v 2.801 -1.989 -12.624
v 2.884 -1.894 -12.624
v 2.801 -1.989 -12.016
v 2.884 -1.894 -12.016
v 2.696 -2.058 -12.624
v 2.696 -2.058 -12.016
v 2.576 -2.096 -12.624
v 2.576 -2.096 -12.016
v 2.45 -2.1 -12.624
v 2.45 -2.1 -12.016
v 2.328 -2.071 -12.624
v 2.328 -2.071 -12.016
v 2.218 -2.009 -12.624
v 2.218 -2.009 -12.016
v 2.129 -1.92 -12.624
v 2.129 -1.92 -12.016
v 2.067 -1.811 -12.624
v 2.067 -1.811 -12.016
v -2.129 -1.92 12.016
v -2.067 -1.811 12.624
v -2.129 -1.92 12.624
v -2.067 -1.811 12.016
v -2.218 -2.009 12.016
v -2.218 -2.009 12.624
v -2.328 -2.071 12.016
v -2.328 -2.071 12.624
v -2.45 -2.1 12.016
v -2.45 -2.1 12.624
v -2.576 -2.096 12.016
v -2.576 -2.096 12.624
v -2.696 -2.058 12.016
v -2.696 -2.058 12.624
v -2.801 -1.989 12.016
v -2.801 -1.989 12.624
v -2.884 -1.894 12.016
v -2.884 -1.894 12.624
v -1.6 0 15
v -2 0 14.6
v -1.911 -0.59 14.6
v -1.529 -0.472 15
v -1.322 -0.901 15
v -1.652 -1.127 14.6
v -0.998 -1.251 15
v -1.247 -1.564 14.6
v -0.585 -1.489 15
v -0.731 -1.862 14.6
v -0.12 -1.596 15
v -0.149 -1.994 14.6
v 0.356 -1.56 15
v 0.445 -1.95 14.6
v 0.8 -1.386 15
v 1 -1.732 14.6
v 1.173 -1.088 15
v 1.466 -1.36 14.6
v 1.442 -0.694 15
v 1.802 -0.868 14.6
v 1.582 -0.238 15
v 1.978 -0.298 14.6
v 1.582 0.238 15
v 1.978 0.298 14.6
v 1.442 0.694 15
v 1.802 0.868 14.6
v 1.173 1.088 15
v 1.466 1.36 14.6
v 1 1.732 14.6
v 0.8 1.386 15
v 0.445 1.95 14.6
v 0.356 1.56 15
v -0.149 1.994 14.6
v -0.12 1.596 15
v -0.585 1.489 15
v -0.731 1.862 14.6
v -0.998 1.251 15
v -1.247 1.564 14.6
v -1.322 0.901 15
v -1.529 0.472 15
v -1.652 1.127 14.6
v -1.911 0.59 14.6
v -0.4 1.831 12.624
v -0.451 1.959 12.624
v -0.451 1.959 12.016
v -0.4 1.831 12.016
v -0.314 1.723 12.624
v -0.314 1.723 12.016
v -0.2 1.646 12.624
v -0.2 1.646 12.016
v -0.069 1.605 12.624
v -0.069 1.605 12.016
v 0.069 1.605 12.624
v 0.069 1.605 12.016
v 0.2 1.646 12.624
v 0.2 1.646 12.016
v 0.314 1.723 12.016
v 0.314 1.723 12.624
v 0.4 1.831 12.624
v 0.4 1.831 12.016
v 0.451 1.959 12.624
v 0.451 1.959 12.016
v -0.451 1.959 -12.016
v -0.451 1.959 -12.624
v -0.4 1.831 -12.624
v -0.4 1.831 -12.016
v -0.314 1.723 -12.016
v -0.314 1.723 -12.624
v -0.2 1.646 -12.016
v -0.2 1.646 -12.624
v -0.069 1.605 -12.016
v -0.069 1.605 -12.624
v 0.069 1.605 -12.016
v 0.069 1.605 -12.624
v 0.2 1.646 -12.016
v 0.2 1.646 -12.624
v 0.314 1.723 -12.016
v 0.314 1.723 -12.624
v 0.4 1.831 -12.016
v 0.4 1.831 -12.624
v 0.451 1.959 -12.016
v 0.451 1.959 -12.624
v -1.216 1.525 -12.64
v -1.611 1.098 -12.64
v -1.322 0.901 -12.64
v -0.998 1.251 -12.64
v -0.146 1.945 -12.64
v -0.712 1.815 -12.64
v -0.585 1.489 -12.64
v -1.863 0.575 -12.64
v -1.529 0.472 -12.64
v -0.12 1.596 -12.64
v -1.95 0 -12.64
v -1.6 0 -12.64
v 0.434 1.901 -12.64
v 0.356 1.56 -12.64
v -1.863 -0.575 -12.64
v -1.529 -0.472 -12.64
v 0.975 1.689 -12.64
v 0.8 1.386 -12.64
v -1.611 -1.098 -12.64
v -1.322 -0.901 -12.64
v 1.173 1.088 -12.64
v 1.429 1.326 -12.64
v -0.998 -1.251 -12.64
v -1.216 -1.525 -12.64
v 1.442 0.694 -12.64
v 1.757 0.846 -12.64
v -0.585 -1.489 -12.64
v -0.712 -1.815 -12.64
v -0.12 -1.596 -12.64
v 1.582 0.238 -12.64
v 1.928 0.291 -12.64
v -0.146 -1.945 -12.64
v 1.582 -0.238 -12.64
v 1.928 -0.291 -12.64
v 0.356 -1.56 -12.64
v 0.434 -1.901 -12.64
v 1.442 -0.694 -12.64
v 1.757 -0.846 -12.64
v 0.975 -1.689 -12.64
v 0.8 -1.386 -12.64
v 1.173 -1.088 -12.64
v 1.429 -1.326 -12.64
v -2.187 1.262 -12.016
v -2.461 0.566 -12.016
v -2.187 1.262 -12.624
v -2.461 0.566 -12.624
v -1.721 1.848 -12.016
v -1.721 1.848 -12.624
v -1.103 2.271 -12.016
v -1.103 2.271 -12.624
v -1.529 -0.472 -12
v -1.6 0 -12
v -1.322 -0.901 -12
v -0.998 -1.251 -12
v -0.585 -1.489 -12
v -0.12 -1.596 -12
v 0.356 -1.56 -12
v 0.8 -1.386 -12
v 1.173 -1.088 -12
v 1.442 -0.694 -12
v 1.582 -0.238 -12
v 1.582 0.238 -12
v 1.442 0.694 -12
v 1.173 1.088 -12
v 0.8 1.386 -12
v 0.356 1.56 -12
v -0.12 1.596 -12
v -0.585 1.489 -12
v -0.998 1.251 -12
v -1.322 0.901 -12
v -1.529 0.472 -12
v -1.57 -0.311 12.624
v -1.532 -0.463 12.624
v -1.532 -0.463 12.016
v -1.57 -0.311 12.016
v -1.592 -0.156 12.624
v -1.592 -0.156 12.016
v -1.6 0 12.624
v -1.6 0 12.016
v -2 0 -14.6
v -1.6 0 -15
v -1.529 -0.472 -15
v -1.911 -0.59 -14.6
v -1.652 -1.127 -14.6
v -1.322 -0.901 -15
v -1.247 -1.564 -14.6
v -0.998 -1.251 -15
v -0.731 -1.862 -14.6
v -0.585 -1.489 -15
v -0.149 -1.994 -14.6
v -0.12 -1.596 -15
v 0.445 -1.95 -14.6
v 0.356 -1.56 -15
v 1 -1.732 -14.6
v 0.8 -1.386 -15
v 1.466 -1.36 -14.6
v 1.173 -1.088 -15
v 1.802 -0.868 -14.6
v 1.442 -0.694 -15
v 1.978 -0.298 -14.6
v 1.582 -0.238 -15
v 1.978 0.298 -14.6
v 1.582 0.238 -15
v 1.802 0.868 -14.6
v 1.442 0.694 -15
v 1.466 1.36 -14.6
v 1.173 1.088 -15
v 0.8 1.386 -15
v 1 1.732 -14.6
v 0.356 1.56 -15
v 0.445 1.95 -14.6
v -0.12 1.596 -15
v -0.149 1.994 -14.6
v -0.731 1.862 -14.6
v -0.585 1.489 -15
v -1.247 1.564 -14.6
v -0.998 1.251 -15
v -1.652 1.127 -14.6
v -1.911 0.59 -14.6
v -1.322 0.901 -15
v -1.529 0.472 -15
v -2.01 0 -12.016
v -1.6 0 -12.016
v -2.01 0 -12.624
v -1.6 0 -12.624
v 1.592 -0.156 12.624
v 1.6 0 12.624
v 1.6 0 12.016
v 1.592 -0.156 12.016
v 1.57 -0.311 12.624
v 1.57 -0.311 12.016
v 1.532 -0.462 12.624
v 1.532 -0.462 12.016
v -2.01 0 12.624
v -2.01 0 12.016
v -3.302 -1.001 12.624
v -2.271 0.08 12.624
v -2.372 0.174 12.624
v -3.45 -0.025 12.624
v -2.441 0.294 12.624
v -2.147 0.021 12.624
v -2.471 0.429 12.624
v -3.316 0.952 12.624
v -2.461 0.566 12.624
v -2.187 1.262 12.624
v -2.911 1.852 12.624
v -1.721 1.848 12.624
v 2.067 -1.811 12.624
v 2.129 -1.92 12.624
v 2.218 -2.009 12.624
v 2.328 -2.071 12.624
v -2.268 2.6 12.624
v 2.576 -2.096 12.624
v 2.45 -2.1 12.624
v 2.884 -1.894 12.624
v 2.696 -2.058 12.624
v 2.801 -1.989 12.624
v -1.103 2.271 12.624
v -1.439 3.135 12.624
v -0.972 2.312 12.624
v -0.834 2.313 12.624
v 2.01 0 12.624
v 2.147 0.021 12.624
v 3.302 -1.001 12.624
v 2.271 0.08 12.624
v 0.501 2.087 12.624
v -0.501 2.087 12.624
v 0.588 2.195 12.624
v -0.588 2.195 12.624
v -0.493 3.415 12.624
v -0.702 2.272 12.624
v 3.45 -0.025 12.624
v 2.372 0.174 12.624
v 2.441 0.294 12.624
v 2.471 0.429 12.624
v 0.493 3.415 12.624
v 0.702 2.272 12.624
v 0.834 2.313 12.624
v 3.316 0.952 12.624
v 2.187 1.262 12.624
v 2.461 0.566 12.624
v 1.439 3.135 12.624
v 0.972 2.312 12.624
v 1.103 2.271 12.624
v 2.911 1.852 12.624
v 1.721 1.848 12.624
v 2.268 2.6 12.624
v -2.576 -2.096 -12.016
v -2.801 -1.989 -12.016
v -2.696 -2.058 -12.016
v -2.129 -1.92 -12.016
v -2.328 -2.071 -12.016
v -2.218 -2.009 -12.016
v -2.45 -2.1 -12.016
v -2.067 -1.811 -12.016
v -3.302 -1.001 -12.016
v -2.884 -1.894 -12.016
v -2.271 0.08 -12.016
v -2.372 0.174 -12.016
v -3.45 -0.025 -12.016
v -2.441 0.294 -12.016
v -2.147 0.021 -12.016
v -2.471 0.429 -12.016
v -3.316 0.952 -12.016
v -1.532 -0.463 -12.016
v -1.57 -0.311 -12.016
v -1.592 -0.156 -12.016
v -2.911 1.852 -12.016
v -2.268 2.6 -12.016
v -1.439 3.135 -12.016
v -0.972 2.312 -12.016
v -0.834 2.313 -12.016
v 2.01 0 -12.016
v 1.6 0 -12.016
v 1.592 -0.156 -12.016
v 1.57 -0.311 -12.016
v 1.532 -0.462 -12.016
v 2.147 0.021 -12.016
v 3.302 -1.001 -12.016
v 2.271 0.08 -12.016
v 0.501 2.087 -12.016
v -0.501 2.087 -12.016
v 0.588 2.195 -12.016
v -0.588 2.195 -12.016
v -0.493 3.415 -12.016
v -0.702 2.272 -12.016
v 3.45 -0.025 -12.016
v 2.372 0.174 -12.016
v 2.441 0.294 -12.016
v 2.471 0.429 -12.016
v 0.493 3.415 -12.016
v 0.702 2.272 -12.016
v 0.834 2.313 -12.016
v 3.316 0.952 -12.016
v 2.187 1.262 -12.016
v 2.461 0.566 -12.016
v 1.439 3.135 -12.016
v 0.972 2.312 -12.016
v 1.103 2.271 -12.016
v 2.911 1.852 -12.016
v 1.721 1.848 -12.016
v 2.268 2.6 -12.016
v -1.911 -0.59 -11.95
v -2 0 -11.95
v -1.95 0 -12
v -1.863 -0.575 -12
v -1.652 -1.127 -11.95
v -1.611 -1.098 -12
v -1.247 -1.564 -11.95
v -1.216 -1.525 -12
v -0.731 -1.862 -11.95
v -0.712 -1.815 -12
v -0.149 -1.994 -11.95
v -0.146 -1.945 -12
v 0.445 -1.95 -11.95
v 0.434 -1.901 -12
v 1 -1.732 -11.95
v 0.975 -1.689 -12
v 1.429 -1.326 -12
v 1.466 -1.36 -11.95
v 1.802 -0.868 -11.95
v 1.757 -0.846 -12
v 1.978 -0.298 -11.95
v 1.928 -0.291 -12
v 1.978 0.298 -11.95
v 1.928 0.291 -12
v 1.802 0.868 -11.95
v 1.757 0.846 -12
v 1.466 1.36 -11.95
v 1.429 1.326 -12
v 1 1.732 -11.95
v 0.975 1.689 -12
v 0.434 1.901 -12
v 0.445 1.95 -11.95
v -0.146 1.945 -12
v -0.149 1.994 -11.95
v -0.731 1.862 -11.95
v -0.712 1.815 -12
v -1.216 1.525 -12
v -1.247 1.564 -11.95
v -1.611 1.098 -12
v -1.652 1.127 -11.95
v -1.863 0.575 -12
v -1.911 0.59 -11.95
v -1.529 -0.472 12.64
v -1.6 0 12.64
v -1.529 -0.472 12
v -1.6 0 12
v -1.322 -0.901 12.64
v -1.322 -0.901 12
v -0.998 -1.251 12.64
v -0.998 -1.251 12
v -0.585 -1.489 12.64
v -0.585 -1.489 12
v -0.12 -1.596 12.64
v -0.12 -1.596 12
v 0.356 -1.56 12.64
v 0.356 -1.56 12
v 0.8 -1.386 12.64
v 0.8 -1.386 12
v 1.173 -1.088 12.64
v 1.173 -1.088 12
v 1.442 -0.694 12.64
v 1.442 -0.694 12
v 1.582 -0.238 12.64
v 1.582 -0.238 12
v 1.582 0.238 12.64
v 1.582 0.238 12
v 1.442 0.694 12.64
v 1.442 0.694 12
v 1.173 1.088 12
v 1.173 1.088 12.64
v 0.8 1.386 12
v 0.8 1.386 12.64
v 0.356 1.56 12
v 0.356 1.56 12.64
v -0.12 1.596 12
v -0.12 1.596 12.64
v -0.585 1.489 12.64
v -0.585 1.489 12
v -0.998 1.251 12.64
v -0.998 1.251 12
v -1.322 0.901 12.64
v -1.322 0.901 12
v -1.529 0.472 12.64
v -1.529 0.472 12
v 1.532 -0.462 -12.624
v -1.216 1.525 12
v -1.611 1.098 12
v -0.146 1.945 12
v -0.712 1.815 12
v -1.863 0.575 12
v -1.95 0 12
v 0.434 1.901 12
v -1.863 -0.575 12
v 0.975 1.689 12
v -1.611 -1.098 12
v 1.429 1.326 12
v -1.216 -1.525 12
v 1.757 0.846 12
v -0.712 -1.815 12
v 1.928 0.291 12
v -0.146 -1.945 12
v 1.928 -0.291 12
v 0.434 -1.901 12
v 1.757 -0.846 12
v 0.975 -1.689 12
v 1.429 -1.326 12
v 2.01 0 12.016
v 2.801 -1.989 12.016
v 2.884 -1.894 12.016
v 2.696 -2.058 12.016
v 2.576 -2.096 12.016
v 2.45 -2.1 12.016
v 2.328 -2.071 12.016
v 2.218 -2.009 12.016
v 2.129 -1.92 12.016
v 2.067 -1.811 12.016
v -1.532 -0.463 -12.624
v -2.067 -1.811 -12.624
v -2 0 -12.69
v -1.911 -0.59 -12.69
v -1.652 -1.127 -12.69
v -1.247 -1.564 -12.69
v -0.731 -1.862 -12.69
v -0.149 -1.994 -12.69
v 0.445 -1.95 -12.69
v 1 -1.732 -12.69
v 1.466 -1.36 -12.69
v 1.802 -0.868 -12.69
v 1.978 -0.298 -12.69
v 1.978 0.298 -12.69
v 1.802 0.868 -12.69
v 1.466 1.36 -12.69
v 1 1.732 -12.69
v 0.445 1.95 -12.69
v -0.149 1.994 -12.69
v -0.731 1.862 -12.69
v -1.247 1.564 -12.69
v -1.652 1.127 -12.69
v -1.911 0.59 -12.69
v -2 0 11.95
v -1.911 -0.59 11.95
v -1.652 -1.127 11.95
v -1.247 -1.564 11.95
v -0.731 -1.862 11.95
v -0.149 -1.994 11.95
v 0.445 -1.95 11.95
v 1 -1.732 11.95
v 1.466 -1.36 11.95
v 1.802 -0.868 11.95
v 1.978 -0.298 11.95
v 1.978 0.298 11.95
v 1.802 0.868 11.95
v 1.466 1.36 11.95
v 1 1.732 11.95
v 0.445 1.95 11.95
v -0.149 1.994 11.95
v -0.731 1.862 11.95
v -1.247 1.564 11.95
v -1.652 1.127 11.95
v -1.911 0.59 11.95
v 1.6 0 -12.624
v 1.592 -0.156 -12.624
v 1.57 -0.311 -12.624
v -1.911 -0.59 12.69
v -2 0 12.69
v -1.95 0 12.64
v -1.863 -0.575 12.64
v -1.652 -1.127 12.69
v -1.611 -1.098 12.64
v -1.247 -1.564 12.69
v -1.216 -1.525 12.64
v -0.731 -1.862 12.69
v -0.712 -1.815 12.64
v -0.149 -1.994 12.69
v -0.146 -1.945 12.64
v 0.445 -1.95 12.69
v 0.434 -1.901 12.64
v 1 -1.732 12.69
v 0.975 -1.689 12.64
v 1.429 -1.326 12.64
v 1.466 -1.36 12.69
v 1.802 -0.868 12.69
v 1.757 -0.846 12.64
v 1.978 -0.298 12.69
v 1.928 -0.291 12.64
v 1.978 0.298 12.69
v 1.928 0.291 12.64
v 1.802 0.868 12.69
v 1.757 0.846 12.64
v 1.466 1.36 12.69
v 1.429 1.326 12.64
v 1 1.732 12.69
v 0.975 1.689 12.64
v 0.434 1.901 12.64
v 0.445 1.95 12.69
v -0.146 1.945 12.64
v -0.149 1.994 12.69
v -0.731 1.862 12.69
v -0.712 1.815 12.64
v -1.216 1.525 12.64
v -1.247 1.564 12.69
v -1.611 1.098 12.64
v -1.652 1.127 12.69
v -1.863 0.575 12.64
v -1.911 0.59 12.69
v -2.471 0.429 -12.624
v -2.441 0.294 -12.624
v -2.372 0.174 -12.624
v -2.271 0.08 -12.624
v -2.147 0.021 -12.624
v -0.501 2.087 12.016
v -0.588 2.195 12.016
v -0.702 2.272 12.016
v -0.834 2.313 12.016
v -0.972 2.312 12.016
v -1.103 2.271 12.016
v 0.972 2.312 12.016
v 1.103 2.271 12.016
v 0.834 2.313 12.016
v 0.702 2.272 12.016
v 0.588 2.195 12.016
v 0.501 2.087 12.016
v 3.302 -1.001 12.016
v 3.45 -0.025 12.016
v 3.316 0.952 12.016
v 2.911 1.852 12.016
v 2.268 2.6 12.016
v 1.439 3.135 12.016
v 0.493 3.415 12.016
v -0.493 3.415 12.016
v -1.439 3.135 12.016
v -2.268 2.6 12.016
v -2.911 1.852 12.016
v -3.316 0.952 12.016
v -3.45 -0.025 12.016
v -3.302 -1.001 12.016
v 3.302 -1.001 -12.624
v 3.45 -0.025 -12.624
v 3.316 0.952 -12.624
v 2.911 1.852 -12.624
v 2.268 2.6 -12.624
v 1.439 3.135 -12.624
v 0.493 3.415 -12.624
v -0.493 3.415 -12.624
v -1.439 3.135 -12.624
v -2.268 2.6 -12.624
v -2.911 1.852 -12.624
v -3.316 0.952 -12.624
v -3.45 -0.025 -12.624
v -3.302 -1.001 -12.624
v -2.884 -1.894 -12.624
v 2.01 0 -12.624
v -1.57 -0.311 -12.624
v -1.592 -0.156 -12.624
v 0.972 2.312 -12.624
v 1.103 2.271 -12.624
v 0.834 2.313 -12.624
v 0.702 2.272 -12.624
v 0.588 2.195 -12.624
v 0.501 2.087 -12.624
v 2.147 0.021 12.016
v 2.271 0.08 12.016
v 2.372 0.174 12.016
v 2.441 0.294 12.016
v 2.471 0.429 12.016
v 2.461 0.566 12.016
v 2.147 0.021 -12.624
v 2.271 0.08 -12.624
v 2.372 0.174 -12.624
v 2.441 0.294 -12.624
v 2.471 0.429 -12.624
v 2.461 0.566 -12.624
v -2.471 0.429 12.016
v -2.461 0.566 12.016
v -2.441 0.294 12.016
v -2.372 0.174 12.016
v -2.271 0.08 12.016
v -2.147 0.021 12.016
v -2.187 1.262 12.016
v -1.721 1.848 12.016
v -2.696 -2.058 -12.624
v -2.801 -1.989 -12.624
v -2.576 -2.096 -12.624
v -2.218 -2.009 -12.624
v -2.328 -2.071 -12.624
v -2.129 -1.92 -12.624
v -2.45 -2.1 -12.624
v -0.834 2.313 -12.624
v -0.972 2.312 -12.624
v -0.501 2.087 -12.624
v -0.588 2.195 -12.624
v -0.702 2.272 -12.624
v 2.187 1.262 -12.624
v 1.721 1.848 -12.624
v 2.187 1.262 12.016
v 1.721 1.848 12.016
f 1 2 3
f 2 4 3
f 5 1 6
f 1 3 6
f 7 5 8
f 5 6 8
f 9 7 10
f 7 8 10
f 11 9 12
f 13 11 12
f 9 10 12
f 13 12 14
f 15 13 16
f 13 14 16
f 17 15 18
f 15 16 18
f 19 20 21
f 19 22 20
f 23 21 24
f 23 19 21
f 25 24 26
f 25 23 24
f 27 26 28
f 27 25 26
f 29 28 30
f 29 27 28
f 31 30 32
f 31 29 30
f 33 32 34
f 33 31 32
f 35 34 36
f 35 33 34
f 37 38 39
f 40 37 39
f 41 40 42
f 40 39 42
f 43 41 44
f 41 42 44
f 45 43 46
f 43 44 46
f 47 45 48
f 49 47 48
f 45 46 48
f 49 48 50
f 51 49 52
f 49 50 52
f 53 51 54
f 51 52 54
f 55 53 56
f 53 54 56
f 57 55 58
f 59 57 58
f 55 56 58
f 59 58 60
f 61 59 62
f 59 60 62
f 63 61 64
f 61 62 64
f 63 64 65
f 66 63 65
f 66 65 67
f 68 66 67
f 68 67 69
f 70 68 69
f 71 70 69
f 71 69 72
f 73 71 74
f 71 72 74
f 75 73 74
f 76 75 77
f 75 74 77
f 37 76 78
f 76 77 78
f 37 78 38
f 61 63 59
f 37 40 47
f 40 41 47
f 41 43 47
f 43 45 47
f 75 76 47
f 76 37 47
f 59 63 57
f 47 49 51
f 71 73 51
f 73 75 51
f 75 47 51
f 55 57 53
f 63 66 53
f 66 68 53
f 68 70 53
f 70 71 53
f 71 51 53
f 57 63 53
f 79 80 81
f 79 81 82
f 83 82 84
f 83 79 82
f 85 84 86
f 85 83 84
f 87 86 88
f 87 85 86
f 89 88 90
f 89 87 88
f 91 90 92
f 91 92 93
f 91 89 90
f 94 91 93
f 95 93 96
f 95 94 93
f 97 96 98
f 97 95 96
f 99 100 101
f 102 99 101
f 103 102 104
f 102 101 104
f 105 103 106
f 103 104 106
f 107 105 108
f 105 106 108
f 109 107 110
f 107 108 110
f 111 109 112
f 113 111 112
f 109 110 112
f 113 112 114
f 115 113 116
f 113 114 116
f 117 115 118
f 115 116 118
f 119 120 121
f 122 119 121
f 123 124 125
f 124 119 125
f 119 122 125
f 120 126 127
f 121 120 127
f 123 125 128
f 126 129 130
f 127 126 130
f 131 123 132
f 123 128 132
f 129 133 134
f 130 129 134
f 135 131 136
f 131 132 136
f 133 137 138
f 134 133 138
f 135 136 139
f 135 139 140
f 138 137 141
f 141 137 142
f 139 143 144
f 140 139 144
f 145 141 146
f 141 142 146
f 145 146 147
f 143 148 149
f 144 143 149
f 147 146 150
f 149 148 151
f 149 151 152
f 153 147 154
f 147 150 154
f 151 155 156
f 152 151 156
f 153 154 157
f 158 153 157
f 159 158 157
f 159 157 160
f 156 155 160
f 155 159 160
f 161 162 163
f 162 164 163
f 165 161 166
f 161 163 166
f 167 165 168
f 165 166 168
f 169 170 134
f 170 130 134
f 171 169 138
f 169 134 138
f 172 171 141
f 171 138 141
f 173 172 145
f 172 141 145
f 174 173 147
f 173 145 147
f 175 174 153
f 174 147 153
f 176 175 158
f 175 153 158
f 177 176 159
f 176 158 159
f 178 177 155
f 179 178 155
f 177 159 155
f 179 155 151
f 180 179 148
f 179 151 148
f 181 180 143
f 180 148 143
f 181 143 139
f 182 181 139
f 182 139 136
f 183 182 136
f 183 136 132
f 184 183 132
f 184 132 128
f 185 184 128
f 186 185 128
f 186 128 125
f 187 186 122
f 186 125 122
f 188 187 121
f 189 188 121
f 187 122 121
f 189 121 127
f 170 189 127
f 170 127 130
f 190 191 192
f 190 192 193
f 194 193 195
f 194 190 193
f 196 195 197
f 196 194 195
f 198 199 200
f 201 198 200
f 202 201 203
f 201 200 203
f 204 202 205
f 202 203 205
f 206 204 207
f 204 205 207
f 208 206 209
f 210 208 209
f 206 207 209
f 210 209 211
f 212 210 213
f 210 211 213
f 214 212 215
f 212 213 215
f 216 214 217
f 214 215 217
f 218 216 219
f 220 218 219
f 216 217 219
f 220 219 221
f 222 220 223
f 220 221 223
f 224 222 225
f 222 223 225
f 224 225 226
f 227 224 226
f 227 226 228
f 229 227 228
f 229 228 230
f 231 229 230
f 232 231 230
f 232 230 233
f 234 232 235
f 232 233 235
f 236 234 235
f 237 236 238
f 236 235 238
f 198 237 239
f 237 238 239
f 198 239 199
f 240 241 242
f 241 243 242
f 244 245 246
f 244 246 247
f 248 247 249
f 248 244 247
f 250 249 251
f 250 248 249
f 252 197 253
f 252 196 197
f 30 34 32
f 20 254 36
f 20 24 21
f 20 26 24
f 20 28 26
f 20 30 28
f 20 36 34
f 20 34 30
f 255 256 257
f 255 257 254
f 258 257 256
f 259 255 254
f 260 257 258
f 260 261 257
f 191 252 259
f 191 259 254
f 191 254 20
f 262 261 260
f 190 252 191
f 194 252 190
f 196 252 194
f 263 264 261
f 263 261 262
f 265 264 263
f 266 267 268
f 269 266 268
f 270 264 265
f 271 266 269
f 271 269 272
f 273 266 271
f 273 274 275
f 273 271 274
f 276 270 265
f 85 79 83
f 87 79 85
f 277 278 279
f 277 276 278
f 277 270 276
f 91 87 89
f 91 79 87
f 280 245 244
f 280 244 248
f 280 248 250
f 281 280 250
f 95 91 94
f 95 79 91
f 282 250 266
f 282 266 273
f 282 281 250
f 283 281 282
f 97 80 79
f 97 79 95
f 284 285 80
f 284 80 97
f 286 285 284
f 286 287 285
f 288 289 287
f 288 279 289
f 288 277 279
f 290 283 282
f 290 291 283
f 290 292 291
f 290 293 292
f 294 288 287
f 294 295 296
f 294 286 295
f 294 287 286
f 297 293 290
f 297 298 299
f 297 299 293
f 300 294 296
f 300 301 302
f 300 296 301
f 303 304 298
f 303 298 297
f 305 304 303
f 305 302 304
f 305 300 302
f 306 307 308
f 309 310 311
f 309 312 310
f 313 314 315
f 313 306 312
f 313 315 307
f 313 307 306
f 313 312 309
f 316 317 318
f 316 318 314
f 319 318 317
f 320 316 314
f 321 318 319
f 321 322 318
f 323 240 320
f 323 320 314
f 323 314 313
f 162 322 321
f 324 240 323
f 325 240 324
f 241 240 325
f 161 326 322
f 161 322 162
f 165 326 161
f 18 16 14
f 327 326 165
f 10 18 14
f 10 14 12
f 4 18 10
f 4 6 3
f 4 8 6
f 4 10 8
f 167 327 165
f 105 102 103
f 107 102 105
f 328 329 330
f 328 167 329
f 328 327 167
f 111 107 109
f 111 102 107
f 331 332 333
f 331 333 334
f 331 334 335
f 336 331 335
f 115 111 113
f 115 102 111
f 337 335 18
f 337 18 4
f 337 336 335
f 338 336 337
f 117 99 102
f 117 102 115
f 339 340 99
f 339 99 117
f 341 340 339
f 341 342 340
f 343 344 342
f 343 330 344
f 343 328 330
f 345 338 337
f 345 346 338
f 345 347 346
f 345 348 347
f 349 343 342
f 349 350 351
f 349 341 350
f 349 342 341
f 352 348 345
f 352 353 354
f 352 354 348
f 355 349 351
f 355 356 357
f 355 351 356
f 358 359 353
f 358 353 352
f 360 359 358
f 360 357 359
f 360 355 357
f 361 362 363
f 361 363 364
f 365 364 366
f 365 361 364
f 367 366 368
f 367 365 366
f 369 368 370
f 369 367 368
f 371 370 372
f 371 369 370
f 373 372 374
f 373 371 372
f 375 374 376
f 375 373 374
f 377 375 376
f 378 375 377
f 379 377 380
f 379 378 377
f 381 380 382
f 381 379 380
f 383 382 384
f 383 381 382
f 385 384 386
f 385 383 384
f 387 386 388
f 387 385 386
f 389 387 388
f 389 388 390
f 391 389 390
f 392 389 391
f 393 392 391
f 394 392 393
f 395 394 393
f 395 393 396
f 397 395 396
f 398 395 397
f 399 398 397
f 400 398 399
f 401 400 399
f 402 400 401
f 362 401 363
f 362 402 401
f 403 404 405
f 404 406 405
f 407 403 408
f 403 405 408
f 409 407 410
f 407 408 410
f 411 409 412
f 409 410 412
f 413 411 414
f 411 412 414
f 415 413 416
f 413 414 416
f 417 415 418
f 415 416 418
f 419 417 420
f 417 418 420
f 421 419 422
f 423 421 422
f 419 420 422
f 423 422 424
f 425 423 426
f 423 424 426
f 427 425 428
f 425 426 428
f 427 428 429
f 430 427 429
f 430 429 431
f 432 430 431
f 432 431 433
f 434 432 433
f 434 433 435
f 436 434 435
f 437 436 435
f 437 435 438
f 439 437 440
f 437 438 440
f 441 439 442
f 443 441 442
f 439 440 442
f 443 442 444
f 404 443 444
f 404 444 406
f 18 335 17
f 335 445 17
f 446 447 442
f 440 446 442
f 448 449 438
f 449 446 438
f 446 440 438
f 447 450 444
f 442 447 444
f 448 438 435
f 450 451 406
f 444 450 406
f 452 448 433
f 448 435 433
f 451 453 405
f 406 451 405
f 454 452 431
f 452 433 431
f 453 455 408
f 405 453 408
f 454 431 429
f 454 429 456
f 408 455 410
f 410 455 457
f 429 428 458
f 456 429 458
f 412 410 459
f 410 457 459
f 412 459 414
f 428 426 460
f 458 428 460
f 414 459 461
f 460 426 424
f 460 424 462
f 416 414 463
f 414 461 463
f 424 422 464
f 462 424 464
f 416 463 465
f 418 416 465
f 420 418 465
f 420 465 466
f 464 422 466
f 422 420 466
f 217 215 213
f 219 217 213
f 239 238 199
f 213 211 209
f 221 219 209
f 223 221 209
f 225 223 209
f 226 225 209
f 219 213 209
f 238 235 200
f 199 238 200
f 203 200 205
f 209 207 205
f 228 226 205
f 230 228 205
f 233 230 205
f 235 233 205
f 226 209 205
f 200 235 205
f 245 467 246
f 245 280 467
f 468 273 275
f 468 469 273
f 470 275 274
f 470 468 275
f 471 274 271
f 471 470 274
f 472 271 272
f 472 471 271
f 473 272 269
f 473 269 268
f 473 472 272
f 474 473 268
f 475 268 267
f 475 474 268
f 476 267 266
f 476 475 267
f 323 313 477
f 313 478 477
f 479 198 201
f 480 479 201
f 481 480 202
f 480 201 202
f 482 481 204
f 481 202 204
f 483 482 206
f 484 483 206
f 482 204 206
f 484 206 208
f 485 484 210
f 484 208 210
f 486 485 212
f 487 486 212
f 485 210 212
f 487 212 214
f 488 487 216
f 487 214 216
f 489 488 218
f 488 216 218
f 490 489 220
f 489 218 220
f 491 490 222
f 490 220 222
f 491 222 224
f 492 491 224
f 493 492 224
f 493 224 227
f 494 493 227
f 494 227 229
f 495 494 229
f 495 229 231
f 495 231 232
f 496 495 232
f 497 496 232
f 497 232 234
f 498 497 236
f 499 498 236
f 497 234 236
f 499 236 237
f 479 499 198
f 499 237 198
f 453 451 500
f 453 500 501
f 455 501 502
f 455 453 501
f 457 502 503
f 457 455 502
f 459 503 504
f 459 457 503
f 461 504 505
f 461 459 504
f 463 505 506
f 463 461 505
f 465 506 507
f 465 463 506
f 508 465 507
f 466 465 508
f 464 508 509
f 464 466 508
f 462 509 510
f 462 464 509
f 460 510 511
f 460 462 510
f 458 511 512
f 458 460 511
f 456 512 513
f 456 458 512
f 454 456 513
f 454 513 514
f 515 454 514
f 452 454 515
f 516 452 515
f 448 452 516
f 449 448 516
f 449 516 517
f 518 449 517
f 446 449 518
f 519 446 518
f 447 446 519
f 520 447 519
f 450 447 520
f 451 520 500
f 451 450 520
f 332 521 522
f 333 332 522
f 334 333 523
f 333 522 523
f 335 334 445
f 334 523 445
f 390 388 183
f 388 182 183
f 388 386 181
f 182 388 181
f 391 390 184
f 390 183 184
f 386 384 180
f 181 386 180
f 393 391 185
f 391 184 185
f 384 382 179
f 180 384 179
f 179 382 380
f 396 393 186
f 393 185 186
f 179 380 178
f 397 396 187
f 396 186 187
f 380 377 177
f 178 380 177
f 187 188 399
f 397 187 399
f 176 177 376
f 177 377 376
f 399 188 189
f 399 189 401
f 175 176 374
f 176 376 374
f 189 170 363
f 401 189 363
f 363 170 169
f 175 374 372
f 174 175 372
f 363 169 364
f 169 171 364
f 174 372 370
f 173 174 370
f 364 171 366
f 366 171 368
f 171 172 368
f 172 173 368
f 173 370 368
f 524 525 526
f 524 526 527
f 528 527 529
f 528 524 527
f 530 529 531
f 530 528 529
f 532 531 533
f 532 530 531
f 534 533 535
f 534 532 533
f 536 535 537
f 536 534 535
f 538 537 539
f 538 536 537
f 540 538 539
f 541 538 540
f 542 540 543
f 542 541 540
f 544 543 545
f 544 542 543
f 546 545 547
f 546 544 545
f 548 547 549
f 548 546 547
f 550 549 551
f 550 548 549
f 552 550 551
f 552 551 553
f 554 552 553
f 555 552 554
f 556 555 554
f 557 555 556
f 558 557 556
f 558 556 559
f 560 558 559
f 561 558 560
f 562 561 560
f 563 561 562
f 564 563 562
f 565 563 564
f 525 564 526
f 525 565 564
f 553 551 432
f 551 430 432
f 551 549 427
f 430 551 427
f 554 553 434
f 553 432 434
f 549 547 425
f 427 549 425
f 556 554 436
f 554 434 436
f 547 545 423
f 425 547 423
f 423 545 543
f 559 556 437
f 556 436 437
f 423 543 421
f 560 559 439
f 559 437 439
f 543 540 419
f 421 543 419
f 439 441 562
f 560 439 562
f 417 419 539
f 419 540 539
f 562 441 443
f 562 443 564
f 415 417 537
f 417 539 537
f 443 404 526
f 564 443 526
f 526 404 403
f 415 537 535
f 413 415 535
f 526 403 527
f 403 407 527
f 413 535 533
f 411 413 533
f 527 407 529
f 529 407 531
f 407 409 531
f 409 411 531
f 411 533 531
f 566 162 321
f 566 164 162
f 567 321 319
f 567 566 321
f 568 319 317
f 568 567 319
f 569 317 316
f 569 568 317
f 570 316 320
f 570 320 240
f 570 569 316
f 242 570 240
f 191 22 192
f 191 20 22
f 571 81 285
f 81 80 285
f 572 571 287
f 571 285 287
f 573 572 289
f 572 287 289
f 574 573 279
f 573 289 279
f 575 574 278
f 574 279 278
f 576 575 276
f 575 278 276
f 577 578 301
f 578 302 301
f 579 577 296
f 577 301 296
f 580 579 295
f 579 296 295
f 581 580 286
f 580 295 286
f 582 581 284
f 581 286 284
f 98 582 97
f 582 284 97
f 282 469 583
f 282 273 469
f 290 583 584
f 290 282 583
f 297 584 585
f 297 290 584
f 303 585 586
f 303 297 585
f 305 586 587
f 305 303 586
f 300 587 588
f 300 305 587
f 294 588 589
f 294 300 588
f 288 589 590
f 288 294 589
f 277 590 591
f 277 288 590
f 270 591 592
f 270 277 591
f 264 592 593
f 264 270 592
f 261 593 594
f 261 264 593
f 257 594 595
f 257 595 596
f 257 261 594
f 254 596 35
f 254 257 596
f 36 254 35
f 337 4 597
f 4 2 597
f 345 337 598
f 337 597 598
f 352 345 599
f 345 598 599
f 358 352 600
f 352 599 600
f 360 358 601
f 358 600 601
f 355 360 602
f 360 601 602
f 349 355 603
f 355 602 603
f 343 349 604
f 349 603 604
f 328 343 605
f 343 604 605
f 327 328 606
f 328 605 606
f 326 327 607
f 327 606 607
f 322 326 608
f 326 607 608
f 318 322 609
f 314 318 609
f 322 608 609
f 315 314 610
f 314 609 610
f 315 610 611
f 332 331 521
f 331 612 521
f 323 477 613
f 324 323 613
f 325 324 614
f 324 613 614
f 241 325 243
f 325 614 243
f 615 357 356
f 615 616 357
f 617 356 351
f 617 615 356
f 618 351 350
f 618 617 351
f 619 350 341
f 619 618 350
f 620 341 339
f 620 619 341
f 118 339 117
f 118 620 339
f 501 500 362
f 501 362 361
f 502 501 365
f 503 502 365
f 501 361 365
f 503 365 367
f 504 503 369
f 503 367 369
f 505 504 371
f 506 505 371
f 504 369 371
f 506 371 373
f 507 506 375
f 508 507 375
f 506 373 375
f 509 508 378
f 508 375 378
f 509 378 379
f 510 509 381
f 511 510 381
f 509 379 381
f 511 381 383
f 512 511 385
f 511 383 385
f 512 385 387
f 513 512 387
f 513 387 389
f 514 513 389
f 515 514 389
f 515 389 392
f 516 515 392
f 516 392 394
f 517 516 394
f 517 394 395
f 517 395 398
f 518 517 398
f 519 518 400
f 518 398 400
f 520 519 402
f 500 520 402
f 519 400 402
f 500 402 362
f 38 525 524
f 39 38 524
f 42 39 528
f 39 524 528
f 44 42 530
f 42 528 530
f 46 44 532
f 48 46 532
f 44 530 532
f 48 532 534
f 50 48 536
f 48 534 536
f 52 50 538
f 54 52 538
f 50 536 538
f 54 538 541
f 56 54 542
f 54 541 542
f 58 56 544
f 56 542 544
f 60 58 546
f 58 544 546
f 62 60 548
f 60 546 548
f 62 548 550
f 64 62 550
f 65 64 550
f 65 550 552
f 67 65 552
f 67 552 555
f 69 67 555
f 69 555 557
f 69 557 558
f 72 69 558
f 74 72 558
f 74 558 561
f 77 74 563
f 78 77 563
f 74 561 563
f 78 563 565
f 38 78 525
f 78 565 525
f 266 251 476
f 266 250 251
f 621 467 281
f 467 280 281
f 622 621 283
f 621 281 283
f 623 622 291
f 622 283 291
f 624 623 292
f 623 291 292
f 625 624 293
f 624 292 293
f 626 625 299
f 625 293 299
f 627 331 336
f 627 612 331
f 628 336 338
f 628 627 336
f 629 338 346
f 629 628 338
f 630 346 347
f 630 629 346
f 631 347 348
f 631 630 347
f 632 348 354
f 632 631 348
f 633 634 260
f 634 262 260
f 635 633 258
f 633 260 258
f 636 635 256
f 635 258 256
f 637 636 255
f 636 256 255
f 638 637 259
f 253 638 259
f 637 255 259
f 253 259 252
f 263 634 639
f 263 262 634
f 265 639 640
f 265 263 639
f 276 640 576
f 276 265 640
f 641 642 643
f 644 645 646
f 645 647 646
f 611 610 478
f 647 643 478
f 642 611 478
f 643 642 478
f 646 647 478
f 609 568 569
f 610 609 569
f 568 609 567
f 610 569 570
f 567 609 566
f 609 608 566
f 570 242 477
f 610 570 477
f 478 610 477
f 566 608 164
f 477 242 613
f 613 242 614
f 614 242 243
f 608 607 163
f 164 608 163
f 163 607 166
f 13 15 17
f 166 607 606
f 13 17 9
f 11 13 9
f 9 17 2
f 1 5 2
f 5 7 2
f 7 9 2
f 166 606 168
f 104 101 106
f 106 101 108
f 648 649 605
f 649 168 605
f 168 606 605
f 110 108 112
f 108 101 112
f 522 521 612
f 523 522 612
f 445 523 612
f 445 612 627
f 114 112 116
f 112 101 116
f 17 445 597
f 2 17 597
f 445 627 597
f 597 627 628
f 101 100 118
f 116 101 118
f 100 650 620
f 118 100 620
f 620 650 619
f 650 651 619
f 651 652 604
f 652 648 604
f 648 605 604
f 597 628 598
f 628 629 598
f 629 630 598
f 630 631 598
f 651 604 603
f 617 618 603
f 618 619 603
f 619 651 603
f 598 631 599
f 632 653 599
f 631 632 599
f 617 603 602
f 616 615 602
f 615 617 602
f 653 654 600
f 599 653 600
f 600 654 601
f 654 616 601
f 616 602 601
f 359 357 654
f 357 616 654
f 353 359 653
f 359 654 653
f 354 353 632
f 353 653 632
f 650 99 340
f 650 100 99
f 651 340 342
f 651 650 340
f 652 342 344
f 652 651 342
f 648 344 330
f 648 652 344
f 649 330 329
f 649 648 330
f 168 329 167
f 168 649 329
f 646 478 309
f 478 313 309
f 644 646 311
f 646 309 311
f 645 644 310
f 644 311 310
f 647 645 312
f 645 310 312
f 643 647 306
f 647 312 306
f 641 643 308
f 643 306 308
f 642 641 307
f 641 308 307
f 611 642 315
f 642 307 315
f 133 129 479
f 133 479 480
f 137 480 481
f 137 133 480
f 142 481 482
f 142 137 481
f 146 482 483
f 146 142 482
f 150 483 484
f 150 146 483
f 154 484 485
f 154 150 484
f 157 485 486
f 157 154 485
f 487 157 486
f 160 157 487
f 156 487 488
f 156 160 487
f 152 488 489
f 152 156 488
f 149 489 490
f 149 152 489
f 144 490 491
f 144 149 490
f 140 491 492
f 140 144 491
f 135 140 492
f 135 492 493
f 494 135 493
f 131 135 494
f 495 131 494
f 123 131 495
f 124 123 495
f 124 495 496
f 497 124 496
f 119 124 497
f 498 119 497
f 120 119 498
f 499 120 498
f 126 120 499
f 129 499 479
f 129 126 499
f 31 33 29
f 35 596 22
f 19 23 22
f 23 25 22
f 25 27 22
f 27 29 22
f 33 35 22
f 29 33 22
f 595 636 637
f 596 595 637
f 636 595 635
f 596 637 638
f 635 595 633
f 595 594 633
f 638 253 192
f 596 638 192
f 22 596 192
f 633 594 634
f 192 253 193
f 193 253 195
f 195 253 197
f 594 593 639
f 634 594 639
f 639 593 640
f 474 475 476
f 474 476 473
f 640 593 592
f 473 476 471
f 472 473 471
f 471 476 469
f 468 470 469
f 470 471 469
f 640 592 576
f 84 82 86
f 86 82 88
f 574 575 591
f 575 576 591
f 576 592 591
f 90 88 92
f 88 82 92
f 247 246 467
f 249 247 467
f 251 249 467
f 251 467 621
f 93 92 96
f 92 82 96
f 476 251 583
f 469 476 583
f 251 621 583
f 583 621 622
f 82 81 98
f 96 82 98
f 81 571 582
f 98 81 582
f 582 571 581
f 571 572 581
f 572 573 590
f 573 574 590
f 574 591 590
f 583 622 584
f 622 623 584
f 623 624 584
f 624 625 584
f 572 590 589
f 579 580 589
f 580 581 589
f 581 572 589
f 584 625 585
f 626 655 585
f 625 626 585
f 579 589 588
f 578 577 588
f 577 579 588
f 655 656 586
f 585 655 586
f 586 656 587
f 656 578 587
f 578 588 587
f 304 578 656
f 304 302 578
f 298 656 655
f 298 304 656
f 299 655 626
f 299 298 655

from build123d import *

# Parameters (mm, degrees)
CHAMFER1_SIZE       = 0.4
BOSS_EXTRUDE2_DEPTH = 0.304
FILLET1_R           = 0.4625
CHAMFER2_SIZE       = 0.05


with BuildPart() as part:
    # Sketch1 → Revolve1 (revolve)
    with BuildSketch(Plane(origin=(0, 0, 0), x_dir=(1, 0, 0), z_dir=(0, 1, 0))):
        Polygon((-2, 12), (-1.6, 12), (-1.6, 12.64), (-2, 12.64), (-2, 15), (0, 15), (0, -15), (-2, -15), (-2, -12.64), (-1.6, -12.64), (-1.6, -12), (-2, -12), align=None)
    revolve(axis=Axis((0, 0, -15), (0, 0, 1)))

    # Chamfer1
    chamfer1_edges = [part.edges().sort_by_distance(p)[0] for p in [
        (2, 0, 15),
        (2, 0, -15),
    ]]
    chamfer(chamfer1_edges, length=CHAMFER1_SIZE)

    # Chamfer2
    chamfer2_edges = [part.edges().sort_by_distance(p)[0] for p in [
        (2, 0, -12.64),
        (2, 0, -12),
        (2, 0, 12),
        (2, 0, 12.64),
    ]]
    chamfer(chamfer2_edges, length=CHAMFER2_SIZE)


with BuildPart() as body_2:
    # Sketch2 → Boss-Extrude2 (new, symmetric)
    with BuildSketch(Plane.XY.offset(12.32)):
        with BuildLine():
            Line((-2.350930667, -2.525), (-1.531696364, -0.4625))
            ThreePointArc((-1.531696364, -0.4625), (-1.582831984, -0.233758228), (-1.6, 0))
            Line((-1.6, 0), (-2.525, 0))
            ThreePointArc((-2.525, 0), (-1.975513934, 1.572567867), (-0.566212121, 2.460696819))
            Line((-0.566212121, 2.460696819), (-0.450721695, 1.958787879))
            ThreePointArc((-0.450721695, 1.958787879), (0, 1.6), (0.450721695, 1.958787879))
            Line((0.450721695, 1.958787879), (0.566212121, 2.460696819))
            ThreePointArc((0.566212121, 2.460696819), (1.975513934, 1.572567867), (2.525, 0))
            Line((2.525, 0), (1.6, 0))
            ThreePointArc((1.6, 0), (1.582831984, -0.233758228), (1.531696364, -0.4625))
            Line((1.531696364, -0.4625), (2.350930667, -2.525))
            ThreePointArc((2.350930667, -2.525), (0, 3.45), (-2.350930667, -2.525))
        make_face()
    extrude(amount=BOSS_EXTRUDE2_DEPTH, both=True)

    # Fillet1
    fillet1_edges = [body_2.edges().sort_by_distance(p)[0] for p in [
        (2.525, 0, 12.32),
        (-0.566212121, 2.460696819, 12.32),
        (-2.525, 0, 12.32),
        (0.566212121, 2.460696819, 12.32),
        (2.350930667, -2.525, 12.32),
        (-2.350930667, -2.525, 12.32),
    ]]
    fillet(fillet1_edges, radius=FILLET1_R - 0.0001)  # a hair under: the kernel refuses the full size


with BuildPart() as body_3:
    # Mirror1: mirrored copy
    add(body_2.part.mirror(Plane.XY))


solid = Compound([part.part, body_2.part, body_3.part])
